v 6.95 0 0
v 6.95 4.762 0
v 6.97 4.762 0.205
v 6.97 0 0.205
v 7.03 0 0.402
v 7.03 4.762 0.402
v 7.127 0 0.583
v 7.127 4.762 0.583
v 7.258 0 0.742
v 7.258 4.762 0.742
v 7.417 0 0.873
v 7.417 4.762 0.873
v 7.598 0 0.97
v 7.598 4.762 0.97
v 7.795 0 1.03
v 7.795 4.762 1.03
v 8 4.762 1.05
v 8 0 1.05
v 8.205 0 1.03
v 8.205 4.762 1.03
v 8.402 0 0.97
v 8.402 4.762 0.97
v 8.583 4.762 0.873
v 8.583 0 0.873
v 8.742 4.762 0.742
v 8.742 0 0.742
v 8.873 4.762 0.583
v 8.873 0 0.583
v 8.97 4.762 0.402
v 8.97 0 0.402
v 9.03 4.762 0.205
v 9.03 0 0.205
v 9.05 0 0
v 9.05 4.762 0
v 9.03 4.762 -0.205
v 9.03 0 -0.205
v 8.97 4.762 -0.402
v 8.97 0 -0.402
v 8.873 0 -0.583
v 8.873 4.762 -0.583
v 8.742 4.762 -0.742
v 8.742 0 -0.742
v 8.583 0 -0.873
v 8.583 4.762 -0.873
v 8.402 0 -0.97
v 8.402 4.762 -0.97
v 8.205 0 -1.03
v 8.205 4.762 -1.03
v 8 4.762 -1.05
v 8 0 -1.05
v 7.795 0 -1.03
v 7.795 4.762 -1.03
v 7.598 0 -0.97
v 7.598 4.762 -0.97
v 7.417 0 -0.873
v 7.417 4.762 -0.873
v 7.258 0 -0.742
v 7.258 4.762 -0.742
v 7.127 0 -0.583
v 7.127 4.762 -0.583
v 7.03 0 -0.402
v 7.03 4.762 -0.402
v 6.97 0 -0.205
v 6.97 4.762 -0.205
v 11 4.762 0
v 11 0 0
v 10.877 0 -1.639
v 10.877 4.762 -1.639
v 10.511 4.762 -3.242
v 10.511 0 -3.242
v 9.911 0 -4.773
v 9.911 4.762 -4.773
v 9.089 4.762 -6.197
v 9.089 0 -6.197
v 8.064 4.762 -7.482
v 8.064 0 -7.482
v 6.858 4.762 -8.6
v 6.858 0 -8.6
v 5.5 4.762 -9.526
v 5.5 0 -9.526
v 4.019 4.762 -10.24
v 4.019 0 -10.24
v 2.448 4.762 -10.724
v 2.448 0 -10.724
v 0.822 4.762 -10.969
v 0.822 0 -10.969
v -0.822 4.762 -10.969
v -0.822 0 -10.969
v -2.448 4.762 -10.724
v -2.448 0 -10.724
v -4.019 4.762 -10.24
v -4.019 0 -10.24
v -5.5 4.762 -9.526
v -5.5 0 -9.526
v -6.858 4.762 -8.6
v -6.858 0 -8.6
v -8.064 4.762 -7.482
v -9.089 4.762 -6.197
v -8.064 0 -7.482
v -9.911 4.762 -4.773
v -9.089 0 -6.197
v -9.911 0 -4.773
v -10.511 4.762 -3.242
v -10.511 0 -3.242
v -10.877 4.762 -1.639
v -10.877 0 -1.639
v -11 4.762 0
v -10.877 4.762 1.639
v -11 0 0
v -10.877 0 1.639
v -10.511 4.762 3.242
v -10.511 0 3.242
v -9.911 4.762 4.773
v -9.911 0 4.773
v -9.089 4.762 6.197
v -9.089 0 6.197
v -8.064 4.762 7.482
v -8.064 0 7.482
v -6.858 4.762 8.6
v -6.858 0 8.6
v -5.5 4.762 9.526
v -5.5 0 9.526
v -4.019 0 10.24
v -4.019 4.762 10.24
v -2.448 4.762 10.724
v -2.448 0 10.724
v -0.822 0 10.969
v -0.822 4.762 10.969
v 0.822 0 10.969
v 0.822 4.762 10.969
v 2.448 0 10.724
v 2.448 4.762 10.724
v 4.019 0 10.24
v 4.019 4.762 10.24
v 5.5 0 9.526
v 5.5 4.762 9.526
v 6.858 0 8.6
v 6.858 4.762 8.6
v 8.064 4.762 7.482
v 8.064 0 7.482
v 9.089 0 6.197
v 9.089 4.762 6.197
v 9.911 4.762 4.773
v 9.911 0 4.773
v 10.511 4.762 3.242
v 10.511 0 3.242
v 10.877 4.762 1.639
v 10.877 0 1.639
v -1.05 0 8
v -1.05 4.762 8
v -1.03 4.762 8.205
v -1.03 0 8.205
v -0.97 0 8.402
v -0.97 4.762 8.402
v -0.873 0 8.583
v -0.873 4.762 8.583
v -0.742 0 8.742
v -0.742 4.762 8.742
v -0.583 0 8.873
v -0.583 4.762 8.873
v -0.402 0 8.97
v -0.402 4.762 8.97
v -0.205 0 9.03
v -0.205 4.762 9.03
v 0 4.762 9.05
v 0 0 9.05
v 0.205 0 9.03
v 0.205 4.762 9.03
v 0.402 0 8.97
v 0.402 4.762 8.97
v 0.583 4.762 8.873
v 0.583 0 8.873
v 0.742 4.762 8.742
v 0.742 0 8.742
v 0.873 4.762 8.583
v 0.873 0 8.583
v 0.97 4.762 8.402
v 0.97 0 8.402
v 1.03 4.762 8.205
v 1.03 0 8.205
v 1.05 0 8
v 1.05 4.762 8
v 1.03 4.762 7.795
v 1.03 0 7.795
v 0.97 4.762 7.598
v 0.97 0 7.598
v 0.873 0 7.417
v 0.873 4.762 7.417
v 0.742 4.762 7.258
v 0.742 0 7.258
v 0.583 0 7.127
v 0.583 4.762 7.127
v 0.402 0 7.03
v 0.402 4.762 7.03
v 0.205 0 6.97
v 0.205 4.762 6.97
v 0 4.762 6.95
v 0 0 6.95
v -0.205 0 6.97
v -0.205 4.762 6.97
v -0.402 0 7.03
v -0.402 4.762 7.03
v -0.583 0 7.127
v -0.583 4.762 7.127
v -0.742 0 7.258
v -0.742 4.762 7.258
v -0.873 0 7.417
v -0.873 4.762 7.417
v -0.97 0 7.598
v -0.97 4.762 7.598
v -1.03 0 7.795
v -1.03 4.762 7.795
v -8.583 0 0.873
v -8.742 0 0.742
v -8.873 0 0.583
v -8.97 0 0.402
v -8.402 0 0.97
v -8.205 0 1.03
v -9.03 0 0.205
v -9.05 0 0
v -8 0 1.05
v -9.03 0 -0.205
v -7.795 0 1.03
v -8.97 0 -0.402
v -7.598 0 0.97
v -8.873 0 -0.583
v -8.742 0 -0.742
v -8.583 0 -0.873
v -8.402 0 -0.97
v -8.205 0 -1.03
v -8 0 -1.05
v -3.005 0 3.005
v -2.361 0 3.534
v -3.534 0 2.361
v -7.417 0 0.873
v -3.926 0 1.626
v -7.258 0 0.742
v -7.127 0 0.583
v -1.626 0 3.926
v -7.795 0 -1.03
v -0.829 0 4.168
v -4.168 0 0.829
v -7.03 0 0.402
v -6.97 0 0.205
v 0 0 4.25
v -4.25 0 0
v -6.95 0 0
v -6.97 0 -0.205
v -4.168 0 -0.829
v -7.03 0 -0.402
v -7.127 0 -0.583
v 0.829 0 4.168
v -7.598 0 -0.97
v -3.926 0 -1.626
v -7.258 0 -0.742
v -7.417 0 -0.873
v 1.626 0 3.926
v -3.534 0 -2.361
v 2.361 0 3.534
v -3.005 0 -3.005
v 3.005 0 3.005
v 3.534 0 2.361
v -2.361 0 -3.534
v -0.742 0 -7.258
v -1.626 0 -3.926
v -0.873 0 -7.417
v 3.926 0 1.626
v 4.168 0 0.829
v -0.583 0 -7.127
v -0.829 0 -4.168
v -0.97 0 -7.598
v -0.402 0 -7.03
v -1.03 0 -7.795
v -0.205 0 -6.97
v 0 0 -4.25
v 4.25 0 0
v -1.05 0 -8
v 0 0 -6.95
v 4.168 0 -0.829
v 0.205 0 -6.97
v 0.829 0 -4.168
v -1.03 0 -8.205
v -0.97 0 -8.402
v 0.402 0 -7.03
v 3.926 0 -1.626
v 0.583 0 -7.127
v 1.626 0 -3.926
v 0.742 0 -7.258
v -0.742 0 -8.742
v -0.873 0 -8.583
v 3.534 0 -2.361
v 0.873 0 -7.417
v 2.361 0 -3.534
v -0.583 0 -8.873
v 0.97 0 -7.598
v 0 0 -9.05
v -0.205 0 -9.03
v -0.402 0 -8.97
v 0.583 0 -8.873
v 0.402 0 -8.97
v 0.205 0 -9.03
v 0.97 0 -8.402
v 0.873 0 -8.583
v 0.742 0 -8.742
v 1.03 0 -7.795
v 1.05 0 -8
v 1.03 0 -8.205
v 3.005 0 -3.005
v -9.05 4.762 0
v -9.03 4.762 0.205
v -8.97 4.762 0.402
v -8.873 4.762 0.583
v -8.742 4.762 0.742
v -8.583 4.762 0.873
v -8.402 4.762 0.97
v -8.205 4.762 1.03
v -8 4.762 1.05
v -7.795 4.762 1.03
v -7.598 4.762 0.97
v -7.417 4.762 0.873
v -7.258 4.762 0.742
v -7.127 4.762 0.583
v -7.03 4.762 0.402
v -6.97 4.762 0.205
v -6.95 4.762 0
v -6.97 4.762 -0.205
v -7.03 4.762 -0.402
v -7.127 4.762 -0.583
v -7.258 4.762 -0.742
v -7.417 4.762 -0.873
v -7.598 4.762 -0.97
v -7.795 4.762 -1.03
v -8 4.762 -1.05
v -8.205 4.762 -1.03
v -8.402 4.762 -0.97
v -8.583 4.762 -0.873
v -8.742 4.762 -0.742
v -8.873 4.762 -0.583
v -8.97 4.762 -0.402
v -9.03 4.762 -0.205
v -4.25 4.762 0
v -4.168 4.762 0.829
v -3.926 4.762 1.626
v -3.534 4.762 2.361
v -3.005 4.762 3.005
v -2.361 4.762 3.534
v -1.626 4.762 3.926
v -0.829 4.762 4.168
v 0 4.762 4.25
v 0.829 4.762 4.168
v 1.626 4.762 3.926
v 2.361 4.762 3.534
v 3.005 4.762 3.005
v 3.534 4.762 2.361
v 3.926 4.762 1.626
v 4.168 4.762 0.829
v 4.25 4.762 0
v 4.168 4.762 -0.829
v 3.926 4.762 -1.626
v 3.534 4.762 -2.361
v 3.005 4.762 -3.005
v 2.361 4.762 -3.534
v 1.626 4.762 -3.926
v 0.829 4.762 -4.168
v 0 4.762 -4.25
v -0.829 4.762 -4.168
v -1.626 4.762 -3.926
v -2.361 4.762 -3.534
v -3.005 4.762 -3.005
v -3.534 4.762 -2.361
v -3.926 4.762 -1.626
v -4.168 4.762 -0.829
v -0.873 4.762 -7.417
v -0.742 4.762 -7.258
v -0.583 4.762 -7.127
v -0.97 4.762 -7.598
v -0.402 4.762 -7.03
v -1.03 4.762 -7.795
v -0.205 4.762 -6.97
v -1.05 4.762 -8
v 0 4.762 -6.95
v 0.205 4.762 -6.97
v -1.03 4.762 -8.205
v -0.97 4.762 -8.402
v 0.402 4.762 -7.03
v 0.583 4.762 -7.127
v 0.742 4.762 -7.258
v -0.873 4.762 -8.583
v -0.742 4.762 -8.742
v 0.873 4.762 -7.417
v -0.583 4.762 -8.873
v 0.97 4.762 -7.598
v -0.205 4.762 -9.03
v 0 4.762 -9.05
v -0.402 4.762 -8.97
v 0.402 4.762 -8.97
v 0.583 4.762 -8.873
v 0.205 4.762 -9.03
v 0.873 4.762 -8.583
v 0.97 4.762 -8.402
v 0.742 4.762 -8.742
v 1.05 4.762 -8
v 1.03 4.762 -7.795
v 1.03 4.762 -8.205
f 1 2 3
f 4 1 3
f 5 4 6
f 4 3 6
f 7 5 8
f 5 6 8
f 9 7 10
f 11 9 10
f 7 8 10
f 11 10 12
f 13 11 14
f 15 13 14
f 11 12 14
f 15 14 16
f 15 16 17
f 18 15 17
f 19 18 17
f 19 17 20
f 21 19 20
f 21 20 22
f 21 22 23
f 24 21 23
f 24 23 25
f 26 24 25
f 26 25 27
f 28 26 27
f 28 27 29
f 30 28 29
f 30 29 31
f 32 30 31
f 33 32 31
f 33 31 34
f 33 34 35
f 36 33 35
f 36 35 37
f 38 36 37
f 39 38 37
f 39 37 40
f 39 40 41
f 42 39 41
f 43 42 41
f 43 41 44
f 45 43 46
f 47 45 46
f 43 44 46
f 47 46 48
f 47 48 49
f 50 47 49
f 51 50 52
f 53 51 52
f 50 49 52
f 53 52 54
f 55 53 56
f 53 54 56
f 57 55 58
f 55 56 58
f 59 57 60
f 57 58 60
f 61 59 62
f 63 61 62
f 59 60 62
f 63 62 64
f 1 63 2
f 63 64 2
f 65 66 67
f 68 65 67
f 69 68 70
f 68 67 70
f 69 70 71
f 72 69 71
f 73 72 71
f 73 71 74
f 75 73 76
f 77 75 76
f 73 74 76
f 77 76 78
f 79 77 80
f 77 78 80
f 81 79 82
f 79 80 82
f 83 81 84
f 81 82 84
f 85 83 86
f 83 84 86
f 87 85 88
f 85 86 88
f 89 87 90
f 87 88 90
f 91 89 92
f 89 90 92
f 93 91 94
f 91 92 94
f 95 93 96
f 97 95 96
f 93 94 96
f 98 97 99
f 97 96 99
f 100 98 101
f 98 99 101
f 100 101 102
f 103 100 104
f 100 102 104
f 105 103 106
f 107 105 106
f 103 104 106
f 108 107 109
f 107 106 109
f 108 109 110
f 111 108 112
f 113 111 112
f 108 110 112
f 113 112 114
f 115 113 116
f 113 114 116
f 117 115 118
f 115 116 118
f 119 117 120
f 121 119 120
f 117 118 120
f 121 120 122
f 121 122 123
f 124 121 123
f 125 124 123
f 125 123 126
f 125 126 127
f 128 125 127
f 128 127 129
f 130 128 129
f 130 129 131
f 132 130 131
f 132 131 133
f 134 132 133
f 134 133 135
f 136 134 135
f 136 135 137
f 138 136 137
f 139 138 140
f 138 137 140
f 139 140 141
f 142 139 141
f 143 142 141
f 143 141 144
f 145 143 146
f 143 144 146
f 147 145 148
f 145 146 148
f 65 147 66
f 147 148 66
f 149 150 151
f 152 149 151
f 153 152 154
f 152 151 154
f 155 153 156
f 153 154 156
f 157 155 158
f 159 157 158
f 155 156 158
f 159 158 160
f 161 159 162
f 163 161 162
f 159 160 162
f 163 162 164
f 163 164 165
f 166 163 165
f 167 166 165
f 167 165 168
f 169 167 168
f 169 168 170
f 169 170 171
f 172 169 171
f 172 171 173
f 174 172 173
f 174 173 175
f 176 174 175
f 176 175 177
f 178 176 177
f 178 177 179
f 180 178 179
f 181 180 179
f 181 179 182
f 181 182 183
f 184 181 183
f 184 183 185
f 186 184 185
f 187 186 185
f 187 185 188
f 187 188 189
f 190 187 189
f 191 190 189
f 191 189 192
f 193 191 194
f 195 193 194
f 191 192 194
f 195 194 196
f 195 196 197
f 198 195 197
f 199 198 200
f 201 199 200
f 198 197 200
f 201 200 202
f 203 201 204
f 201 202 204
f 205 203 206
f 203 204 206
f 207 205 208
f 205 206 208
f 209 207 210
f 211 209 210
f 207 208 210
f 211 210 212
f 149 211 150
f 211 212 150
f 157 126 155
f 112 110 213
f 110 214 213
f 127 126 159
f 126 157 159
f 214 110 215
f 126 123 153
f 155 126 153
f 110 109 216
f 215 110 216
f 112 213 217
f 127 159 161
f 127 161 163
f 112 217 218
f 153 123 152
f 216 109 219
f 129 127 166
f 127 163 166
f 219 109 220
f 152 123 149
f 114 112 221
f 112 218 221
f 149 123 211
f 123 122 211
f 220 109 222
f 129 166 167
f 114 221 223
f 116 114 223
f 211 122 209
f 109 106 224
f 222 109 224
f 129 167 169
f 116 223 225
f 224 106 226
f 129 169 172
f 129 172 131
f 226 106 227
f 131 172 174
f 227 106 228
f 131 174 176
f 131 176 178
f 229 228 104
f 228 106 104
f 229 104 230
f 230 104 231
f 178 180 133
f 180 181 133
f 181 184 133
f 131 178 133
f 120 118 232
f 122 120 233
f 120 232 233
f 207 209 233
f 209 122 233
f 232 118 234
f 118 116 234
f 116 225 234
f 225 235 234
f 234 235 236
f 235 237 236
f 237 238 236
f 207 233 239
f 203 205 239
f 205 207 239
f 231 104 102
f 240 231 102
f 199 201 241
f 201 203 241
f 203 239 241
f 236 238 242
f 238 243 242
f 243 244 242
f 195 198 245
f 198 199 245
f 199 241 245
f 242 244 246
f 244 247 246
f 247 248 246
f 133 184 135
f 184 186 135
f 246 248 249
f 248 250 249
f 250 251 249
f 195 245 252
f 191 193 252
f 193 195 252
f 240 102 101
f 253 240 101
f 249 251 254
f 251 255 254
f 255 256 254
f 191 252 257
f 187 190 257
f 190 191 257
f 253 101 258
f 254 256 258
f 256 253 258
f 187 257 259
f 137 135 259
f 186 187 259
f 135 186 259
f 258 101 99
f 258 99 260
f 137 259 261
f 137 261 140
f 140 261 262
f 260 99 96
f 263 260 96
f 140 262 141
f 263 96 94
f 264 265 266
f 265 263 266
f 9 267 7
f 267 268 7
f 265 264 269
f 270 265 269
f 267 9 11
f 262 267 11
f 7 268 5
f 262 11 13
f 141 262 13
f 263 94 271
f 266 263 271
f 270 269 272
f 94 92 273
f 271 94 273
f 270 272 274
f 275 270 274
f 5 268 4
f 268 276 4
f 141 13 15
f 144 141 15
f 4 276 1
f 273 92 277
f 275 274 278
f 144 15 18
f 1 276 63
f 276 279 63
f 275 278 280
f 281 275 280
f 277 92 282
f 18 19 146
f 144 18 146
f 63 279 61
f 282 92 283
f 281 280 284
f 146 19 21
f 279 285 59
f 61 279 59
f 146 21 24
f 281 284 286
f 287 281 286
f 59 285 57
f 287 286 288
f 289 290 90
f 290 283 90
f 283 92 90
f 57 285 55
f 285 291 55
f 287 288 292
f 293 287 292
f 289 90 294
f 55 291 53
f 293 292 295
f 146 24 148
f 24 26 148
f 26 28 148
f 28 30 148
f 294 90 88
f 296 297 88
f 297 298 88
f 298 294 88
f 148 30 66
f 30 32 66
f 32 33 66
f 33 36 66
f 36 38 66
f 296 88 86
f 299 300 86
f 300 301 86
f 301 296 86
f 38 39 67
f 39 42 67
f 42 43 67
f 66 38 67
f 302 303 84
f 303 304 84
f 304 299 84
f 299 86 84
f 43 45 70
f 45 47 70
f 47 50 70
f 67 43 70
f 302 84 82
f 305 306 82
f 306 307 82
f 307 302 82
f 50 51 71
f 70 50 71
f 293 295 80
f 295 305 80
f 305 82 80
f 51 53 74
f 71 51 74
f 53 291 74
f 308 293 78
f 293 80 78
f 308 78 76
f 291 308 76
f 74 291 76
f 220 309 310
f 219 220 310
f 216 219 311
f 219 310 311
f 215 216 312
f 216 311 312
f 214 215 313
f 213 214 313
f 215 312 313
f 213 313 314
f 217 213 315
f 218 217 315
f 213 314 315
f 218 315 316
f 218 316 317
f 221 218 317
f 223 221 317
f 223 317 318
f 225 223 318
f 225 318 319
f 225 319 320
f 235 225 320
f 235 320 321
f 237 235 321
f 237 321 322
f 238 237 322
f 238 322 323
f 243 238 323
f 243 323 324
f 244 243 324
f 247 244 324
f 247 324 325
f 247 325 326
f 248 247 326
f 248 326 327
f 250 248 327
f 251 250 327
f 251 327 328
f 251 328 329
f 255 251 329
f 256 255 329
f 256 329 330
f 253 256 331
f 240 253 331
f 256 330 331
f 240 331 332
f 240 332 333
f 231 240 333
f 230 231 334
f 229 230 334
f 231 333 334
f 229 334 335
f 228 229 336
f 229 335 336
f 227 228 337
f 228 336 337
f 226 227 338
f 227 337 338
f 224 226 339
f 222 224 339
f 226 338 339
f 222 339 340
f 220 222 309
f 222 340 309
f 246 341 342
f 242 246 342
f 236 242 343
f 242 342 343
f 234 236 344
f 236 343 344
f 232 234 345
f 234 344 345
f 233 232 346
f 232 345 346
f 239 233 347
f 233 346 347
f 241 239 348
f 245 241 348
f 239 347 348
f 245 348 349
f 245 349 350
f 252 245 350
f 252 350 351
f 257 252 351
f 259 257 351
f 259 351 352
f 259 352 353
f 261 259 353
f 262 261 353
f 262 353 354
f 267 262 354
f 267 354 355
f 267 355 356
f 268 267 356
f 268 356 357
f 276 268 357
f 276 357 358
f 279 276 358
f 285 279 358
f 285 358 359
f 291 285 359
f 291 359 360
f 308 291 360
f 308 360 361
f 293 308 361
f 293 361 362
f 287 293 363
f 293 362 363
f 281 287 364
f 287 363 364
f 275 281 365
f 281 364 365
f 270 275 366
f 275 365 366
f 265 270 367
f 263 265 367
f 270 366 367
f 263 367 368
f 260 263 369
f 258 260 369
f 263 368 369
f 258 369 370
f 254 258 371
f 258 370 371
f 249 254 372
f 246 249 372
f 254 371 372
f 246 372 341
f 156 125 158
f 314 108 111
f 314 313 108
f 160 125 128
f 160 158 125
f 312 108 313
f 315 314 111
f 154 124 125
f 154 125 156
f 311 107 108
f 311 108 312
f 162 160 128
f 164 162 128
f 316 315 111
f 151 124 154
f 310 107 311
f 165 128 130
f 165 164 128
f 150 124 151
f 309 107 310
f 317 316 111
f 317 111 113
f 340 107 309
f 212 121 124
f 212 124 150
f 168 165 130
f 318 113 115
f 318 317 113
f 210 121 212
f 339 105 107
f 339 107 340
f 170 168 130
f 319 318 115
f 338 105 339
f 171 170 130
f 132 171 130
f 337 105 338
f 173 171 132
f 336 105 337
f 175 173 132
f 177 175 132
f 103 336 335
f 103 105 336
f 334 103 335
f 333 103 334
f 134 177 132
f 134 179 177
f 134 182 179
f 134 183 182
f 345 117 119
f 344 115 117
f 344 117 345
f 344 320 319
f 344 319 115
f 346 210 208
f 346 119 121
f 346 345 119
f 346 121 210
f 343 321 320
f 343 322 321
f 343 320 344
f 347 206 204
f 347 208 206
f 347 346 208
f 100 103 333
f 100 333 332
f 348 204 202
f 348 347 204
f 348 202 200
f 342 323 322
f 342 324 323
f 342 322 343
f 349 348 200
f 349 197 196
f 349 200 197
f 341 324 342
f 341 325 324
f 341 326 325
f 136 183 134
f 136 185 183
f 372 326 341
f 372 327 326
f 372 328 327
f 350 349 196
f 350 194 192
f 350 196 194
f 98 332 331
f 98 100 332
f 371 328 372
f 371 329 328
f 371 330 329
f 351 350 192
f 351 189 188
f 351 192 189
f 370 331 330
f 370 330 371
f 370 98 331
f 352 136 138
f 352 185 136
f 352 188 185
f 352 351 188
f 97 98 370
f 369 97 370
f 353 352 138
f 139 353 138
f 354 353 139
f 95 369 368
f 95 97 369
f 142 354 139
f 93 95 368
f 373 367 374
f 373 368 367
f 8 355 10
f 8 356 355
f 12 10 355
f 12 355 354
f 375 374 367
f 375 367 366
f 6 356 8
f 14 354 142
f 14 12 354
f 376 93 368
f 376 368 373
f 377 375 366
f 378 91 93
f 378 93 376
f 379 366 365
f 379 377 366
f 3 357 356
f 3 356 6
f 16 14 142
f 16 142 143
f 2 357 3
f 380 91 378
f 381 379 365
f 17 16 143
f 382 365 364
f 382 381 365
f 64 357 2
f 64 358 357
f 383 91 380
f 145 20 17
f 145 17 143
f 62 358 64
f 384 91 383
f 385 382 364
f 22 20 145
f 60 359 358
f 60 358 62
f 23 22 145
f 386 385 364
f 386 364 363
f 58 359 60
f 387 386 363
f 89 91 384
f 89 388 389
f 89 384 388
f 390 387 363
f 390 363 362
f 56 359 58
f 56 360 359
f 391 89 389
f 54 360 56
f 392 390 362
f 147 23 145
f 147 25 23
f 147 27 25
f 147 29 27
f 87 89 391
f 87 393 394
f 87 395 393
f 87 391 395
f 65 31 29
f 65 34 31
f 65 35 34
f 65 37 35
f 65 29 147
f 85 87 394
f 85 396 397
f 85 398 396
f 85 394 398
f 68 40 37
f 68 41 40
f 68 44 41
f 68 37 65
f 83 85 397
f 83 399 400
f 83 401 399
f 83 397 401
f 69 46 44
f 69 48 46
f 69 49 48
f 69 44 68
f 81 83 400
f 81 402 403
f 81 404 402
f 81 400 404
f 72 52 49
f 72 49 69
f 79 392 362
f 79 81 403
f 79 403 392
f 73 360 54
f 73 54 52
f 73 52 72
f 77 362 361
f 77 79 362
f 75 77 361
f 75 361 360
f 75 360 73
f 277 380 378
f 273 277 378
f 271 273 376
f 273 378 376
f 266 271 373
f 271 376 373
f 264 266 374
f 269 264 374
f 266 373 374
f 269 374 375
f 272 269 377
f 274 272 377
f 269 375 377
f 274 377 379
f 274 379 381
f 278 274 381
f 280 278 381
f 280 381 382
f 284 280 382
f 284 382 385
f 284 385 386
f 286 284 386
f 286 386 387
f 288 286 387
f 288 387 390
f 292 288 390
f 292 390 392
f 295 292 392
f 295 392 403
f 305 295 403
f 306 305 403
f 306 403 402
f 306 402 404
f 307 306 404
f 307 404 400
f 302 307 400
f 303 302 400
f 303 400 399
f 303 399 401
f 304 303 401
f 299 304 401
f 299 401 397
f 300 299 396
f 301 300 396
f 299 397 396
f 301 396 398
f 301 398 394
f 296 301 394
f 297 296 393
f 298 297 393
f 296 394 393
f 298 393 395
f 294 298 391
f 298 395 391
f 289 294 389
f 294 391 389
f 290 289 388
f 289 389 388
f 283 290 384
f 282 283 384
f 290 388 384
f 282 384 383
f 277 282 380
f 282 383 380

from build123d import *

# Parameters (mm, degrees)
SKETCH1_R           = 11
BOSS_EXTRUDE1_DEPTH = 4.7625
SKETCH2_R           = 1.05
CUT_EXTRUDE1_DEPTH  = 5.7625
SKETCH3_R           = 4.25
CUT_EXTRUDE2_DEPTH  = 5.7625


with BuildPart() as part:
    # Sketch1 → Boss-Extrude1 (new body)
    with BuildSketch(Plane(origin=(0, 0, 0), x_dir=(1, 0, 0), z_dir=(0, 1, 0))):
        Circle(SKETCH1_R)
    extrude(amount=BOSS_EXTRUDE1_DEPTH)

    # Sketch2 → Cut-Extrude1 (cut, through all)
    with BuildSketch(Plane(origin=(0, 4.7625, 0), x_dir=(-1, 0, 0), z_dir=(0, 1, 0))):
        with Locations((0, 8)):
            Circle(SKETCH2_R)
        with Locations((8, 0)):
            Circle(SKETCH2_R)
        with Locations((0, -8)):
            Circle(SKETCH2_R)
        with Locations((-8, 0)):
            Circle(SKETCH2_R)
    extrude(amount=-CUT_EXTRUDE1_DEPTH, mode=Mode.SUBTRACT)

    # Sketch3 → Cut-Extrude2 (cut, through all)
    with BuildSketch(Plane(origin=(0, 4.7625, 0), x_dir=(-1, 0, 0), z_dir=(0, 1, 0))):
        Circle(SKETCH3_R)
    extrude(amount=-CUT_EXTRUDE2_DEPTH, mode=Mode.SUBTRACT)


solid = part.part
